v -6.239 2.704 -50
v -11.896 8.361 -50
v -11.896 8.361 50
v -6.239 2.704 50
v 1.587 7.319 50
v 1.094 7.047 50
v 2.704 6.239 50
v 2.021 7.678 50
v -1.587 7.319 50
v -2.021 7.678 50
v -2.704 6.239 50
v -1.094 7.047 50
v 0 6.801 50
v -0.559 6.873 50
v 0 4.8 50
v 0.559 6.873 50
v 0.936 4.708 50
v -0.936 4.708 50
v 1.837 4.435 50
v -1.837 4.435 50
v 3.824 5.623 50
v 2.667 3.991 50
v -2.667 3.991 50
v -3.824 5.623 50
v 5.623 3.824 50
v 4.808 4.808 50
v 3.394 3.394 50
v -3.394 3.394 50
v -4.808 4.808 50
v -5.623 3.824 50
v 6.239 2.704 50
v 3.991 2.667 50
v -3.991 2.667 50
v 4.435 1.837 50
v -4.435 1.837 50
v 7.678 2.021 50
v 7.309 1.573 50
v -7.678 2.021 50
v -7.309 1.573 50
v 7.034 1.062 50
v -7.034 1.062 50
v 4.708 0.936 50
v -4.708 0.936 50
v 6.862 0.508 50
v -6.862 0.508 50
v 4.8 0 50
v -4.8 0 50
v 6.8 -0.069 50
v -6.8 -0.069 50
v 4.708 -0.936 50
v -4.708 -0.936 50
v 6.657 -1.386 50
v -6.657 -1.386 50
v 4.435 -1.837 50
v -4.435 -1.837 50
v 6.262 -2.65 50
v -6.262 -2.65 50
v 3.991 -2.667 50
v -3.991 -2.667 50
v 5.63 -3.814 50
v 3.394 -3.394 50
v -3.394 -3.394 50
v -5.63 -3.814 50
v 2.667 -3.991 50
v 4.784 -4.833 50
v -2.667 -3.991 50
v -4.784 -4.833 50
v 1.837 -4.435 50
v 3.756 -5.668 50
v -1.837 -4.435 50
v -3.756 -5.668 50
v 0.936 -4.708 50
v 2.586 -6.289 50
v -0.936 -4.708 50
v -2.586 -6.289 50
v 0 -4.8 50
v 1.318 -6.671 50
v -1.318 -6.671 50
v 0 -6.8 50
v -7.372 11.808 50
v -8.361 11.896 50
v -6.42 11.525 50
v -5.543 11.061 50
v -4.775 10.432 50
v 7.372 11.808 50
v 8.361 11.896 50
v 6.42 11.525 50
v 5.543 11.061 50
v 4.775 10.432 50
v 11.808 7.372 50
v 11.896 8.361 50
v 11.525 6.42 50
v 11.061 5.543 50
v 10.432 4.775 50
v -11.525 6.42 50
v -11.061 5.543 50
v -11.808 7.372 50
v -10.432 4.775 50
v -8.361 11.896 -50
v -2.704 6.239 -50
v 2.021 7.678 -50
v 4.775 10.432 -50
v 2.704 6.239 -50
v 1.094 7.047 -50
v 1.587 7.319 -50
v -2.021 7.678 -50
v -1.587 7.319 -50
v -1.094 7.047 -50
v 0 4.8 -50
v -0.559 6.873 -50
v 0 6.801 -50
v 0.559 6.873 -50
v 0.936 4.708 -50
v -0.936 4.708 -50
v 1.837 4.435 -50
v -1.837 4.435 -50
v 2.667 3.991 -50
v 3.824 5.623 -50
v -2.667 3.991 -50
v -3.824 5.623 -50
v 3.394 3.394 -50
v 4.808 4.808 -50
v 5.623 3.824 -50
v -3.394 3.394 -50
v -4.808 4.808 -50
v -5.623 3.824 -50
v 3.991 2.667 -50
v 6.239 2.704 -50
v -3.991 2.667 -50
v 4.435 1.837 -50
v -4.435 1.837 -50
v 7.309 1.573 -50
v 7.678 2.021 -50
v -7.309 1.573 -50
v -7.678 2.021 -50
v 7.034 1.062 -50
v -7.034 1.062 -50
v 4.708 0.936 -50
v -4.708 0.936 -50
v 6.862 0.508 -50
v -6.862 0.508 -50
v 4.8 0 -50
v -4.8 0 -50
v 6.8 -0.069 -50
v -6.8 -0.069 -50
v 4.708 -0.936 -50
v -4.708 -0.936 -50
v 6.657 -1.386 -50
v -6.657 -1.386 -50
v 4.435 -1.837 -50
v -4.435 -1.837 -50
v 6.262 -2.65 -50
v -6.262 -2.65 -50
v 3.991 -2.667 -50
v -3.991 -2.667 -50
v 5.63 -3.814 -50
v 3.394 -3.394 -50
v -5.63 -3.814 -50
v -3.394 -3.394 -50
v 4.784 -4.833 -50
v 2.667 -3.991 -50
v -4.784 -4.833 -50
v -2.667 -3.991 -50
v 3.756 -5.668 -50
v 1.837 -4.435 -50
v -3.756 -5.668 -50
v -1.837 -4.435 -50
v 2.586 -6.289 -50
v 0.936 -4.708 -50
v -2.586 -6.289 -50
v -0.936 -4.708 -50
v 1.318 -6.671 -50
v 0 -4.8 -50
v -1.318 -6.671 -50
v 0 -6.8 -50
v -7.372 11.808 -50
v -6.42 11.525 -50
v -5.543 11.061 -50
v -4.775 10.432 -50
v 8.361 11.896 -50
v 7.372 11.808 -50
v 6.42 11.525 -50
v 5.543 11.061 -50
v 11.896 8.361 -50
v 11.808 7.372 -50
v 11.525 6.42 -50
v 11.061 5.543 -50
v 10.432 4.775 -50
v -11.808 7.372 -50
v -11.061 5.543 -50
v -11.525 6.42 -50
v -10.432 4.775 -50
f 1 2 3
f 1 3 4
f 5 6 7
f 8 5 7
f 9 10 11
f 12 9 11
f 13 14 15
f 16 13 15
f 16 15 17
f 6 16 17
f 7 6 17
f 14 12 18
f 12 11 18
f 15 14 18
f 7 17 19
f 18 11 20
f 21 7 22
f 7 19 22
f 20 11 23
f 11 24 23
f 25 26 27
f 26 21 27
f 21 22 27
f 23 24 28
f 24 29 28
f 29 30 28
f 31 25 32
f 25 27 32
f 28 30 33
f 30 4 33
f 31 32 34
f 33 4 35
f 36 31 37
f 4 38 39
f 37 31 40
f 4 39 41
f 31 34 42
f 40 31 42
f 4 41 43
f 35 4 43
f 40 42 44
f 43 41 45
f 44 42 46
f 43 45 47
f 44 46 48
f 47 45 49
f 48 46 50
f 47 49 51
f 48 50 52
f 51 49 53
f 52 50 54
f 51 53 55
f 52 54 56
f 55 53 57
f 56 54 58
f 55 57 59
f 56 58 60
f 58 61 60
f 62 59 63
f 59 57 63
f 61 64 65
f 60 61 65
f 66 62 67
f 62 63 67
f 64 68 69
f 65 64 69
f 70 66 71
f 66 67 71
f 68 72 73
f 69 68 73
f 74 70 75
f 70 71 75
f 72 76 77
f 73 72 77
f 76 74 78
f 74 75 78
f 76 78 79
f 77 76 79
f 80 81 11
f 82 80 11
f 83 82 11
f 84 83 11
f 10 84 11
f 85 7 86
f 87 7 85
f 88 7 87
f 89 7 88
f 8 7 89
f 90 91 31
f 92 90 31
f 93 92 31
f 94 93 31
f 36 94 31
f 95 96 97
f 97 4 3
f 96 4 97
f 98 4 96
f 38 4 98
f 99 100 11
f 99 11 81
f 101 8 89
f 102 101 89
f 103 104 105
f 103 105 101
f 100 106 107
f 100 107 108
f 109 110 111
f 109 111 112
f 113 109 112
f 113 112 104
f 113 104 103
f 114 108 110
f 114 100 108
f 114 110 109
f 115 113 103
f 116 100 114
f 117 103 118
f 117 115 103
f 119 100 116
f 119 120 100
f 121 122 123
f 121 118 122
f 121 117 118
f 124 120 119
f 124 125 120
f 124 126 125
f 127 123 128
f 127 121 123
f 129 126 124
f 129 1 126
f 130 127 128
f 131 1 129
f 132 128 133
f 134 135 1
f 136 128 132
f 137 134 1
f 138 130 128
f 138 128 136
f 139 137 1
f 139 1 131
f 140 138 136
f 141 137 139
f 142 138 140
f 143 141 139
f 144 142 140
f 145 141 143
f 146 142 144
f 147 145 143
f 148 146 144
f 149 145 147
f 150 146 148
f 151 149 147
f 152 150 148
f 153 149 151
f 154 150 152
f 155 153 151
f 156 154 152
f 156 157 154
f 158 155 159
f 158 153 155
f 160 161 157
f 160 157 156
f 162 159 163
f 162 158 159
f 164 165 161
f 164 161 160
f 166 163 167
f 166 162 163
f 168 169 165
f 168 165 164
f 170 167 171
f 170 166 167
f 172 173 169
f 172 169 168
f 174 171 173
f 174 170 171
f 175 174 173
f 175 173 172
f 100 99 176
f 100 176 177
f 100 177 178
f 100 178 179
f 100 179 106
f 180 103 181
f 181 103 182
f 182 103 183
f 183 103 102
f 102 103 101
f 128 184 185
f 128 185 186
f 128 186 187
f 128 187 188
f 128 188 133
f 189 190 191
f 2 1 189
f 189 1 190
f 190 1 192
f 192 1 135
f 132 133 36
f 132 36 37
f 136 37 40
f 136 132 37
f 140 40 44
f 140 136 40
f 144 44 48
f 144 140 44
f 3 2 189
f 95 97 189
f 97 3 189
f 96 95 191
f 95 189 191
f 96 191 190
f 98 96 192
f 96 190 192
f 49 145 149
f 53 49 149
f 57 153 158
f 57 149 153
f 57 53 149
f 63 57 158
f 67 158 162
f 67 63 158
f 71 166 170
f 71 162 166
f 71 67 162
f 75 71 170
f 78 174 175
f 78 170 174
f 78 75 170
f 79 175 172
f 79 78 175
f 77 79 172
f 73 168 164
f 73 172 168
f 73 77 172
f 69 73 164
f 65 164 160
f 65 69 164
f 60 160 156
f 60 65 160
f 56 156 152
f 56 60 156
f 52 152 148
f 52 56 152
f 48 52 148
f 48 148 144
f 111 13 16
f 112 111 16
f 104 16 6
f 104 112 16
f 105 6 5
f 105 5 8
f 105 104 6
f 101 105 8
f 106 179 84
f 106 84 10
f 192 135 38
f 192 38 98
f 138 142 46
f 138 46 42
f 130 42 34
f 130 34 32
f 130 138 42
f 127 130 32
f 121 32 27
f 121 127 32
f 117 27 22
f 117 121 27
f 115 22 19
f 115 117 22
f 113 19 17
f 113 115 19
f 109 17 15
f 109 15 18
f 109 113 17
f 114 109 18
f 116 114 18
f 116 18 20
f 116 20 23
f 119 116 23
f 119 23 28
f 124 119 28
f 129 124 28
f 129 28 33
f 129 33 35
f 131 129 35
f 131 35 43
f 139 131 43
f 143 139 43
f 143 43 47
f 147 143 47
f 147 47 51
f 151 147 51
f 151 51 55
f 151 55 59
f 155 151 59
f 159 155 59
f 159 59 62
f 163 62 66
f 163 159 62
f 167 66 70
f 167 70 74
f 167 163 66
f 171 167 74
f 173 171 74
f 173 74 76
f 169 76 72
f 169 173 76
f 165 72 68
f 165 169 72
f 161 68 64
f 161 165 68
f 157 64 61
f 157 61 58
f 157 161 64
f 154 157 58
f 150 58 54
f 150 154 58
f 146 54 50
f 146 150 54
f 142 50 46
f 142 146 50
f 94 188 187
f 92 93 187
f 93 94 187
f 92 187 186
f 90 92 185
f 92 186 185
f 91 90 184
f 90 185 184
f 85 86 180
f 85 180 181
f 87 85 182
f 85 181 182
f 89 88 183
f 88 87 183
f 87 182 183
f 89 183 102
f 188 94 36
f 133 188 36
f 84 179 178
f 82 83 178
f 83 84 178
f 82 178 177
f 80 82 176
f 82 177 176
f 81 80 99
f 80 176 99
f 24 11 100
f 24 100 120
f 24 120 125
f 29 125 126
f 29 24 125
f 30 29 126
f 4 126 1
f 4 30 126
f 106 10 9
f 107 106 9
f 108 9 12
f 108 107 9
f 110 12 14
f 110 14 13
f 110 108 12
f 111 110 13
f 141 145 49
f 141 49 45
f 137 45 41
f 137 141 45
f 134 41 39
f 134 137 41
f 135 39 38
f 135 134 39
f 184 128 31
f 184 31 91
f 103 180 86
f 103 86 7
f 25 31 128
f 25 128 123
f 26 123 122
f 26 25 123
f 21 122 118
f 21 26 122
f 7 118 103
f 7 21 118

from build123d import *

# Parameters (mm, degrees)
SKETCH1_R                   = 6.8
SKETCH1_R_2                 = 4.8
TUBE_SURROUNDING_DEPTH      = 50
FIN_START                   = -100
FIN_HOLDERS_DEPTH           = 100
F_3MM_SUPPORT_FILLETS_R     = 3
F_5MM_FIN_HOLDER_ROUNDING_R = 5


with BuildPart() as part:
    # Sketch1 → Tube surrounding (new, symmetric)
    with BuildSketch(Plane.XY):
        Circle(SKETCH1_R)
        Circle(SKETCH1_R_2, mode=Mode.SUBTRACT)
    extrude(amount=TUBE_SURROUNDING_DEPTH, both=True)

    # Sketch2 → Fin holders (add)
    with BuildSketch(Plane.XY.offset(50).offset(FIN_START)):
        with BuildLine():
            Line((-6.239343856, 2.70380995), (-2.70380995, 6.239343856))
            Line((-2.70380995, 6.239343856), (-8.3606642, 11.896198106))
            Line((-8.3606642, 11.896198106), (-7.300004028, 12.956858277))
            Line((-7.300004028, 12.956858277), (0, 5.656854249))
            Line((0, 5.656854249), (7.300004028, 12.956858277))
            Line((7.300004028, 12.956858277), (8.3606642, 11.896198106))
            Line((8.3606642, 11.896198106), (2.70380995, 6.239343856))
            Line((2.70380995, 6.239343856), (6.239343856, 2.70380995))
            Line((6.239343856, 2.70380995), (11.896198106, 8.3606642))
            Line((11.896198106, 8.3606642), (12.956858277, 7.300004028))
            Line((12.956858277, 7.300004028), (4.704593429, -0.952260821))
            ThreePointArc((4.704593429, -0.952260821), (0, 4.8), (-4.704593429, -0.952260821))
            Line((-4.704593429, -0.952260821), (-12.956858277, 7.300004028))
            Line((-12.956858277, 7.300004028), (-11.896198106, 8.3606642))
            Line((-11.896198106, 8.3606642), (-6.239343856, 2.70380995))
        make_face()
    extrude(amount=FIN_HOLDERS_DEPTH)

    # 3mm support fillets
    # the kernel refuses this fillet: 3 mm, written as the material it adds along each edge
    with BuildSketch(Plane(origin=(1.060017294, 6.716871544, -50), x_dir=(-0.9973250573829818, 0.07309398002593596, 0), z_dir=(0, 0, 1)), Plane(origin=(-6.716871544, 1.060017294, -50), x_dir=(-0.07309398002594036, -0.9973250573829815, 0), z_dir=(0, 0, 1))) as f_3mm_support_fillets_piece_1:
        with BuildLine():
            CenterArc((1.38224034, -2.989581697), F_3MM_SUPPORT_FILLETS_R, 94.776406165, 44.415308597)
            Line((-0.88846134, -1.028991511), (0, 0))
            ThreePointArc((0, 0), (0.566218934, -0.023614819), (1.132437869, 0))
        make_face()
    extrude(amount=100)
    with BuildSketch(Plane(origin=(-1.060017294, 6.716871544, -50), x_dir=(-0.7071067811865461, 0.707106781186549, 0), z_dir=(0, 0, 1)), Plane(origin=(6.716871544, 1.060017294, -50), x_dir=(0.7071067811865486, 0.7071067811865466, 0), z_dir=(0, 0, 1))) as f_3mm_support_fillets_piece_2:
        with BuildLine():
            CenterArc((1.359480446, -3), F_3MM_SUPPORT_FILLETS_R, 90, 44.415308597)
            ThreePointArc((-0.740082191, -0.857142857), (-0.352167026, -0.444004423), (0, 0))
            Line((0, 0), (1.359480446, 0))
        make_face()
    extrude(amount=100)

    # 5mm fin holder rounding
    # the kernel refuses this fillet: 5 mm, written as the material it takes off along each edge
    with BuildSketch(Plane(origin=(12.956858277, 7.300004028, -58.926785536), x_dir=(-0.707106781186548, -0.7071067811865471, 0), z_dir=(0, 0, 1)), Plane(origin=(-7.300004028, 12.956858277, -58.926785536), x_dir=(0.7071067811865471, -0.707106781186548, 0), z_dir=(0, 0, 1))) as f_5mm_fin_holder_rounding_piece_1:
        with BuildLine():
            CenterArc((3.570714214, -5), F_5MM_FIN_HOLDER_ROUNDING_R, 90, 45.572995999)
            Line((0, -1.5), (-0.071414284, -1.43))
            ThreePointArc((-0.071414284, -1.43), (-0.1, -0.75), (-0.1, 0))
            Line((-0.1, 0), (0, 0.1))
            Line((0, 0.1), (3.570714214, 0.1))
            Line((3.570714214, 0.1), (3.570714214, 0))
        make_face()
    extrude(amount=117.853571071, mode=Mode.SUBTRACT)
    with BuildSketch(Plane(origin=(-12.956858277, 7.300004028, -58.926785536), x_dir=(0.7071067811865476, 0.7071067811865476, 0), z_dir=(0, 0, 1))) as f_5mm_fin_holder_rounding_piece_2:
        with BuildLine():
            CenterArc((5, -3.570714214), F_5MM_FIN_HOLDER_ROUNDING_R, 134.427004001, 45.572995999)
            Line((0, -3.570714214), (-0.1, -3.570714214))
            Line((-0.1, -3.570714214), (-0.1, 0))
            Line((-0.1, 0), (0, 0.1))
            ThreePointArc((0, 0.1), (0.75, 0.1), (1.43, 0.071414284))
            Line((1.43, 0.071414284), (1.5, 0))
        make_face()
    extrude(amount=117.853571071, mode=Mode.SUBTRACT)
    with BuildSketch(Plane(origin=(7.300004028, 12.956858277, -58.926785536), x_dir=(-0.707106781186548, -0.707106781186547, 0), z_dir=(0, 0, 1))) as f_5mm_fin_holder_rounding_piece_3:
        with BuildLine():
            CenterArc((3.570714214, 5), F_5MM_FIN_HOLDER_ROUNDING_R, 224.427004001, 45.572995999)
            Line((0, 1.5), (-0.071414284, 1.43))
            ThreePointArc((-0.071414284, 1.43), (-0.1, 0.75), (-0.1, 0))
            Line((-0.1, 0), (0, -0.1))
            Line((0, -0.1), (3.570714214, -0.1))
            Line((3.570714214, -0.1), (3.570714214, 0))
        make_face()
    extrude(amount=117.853571071, mode=Mode.SUBTRACT)


solid = part.part
